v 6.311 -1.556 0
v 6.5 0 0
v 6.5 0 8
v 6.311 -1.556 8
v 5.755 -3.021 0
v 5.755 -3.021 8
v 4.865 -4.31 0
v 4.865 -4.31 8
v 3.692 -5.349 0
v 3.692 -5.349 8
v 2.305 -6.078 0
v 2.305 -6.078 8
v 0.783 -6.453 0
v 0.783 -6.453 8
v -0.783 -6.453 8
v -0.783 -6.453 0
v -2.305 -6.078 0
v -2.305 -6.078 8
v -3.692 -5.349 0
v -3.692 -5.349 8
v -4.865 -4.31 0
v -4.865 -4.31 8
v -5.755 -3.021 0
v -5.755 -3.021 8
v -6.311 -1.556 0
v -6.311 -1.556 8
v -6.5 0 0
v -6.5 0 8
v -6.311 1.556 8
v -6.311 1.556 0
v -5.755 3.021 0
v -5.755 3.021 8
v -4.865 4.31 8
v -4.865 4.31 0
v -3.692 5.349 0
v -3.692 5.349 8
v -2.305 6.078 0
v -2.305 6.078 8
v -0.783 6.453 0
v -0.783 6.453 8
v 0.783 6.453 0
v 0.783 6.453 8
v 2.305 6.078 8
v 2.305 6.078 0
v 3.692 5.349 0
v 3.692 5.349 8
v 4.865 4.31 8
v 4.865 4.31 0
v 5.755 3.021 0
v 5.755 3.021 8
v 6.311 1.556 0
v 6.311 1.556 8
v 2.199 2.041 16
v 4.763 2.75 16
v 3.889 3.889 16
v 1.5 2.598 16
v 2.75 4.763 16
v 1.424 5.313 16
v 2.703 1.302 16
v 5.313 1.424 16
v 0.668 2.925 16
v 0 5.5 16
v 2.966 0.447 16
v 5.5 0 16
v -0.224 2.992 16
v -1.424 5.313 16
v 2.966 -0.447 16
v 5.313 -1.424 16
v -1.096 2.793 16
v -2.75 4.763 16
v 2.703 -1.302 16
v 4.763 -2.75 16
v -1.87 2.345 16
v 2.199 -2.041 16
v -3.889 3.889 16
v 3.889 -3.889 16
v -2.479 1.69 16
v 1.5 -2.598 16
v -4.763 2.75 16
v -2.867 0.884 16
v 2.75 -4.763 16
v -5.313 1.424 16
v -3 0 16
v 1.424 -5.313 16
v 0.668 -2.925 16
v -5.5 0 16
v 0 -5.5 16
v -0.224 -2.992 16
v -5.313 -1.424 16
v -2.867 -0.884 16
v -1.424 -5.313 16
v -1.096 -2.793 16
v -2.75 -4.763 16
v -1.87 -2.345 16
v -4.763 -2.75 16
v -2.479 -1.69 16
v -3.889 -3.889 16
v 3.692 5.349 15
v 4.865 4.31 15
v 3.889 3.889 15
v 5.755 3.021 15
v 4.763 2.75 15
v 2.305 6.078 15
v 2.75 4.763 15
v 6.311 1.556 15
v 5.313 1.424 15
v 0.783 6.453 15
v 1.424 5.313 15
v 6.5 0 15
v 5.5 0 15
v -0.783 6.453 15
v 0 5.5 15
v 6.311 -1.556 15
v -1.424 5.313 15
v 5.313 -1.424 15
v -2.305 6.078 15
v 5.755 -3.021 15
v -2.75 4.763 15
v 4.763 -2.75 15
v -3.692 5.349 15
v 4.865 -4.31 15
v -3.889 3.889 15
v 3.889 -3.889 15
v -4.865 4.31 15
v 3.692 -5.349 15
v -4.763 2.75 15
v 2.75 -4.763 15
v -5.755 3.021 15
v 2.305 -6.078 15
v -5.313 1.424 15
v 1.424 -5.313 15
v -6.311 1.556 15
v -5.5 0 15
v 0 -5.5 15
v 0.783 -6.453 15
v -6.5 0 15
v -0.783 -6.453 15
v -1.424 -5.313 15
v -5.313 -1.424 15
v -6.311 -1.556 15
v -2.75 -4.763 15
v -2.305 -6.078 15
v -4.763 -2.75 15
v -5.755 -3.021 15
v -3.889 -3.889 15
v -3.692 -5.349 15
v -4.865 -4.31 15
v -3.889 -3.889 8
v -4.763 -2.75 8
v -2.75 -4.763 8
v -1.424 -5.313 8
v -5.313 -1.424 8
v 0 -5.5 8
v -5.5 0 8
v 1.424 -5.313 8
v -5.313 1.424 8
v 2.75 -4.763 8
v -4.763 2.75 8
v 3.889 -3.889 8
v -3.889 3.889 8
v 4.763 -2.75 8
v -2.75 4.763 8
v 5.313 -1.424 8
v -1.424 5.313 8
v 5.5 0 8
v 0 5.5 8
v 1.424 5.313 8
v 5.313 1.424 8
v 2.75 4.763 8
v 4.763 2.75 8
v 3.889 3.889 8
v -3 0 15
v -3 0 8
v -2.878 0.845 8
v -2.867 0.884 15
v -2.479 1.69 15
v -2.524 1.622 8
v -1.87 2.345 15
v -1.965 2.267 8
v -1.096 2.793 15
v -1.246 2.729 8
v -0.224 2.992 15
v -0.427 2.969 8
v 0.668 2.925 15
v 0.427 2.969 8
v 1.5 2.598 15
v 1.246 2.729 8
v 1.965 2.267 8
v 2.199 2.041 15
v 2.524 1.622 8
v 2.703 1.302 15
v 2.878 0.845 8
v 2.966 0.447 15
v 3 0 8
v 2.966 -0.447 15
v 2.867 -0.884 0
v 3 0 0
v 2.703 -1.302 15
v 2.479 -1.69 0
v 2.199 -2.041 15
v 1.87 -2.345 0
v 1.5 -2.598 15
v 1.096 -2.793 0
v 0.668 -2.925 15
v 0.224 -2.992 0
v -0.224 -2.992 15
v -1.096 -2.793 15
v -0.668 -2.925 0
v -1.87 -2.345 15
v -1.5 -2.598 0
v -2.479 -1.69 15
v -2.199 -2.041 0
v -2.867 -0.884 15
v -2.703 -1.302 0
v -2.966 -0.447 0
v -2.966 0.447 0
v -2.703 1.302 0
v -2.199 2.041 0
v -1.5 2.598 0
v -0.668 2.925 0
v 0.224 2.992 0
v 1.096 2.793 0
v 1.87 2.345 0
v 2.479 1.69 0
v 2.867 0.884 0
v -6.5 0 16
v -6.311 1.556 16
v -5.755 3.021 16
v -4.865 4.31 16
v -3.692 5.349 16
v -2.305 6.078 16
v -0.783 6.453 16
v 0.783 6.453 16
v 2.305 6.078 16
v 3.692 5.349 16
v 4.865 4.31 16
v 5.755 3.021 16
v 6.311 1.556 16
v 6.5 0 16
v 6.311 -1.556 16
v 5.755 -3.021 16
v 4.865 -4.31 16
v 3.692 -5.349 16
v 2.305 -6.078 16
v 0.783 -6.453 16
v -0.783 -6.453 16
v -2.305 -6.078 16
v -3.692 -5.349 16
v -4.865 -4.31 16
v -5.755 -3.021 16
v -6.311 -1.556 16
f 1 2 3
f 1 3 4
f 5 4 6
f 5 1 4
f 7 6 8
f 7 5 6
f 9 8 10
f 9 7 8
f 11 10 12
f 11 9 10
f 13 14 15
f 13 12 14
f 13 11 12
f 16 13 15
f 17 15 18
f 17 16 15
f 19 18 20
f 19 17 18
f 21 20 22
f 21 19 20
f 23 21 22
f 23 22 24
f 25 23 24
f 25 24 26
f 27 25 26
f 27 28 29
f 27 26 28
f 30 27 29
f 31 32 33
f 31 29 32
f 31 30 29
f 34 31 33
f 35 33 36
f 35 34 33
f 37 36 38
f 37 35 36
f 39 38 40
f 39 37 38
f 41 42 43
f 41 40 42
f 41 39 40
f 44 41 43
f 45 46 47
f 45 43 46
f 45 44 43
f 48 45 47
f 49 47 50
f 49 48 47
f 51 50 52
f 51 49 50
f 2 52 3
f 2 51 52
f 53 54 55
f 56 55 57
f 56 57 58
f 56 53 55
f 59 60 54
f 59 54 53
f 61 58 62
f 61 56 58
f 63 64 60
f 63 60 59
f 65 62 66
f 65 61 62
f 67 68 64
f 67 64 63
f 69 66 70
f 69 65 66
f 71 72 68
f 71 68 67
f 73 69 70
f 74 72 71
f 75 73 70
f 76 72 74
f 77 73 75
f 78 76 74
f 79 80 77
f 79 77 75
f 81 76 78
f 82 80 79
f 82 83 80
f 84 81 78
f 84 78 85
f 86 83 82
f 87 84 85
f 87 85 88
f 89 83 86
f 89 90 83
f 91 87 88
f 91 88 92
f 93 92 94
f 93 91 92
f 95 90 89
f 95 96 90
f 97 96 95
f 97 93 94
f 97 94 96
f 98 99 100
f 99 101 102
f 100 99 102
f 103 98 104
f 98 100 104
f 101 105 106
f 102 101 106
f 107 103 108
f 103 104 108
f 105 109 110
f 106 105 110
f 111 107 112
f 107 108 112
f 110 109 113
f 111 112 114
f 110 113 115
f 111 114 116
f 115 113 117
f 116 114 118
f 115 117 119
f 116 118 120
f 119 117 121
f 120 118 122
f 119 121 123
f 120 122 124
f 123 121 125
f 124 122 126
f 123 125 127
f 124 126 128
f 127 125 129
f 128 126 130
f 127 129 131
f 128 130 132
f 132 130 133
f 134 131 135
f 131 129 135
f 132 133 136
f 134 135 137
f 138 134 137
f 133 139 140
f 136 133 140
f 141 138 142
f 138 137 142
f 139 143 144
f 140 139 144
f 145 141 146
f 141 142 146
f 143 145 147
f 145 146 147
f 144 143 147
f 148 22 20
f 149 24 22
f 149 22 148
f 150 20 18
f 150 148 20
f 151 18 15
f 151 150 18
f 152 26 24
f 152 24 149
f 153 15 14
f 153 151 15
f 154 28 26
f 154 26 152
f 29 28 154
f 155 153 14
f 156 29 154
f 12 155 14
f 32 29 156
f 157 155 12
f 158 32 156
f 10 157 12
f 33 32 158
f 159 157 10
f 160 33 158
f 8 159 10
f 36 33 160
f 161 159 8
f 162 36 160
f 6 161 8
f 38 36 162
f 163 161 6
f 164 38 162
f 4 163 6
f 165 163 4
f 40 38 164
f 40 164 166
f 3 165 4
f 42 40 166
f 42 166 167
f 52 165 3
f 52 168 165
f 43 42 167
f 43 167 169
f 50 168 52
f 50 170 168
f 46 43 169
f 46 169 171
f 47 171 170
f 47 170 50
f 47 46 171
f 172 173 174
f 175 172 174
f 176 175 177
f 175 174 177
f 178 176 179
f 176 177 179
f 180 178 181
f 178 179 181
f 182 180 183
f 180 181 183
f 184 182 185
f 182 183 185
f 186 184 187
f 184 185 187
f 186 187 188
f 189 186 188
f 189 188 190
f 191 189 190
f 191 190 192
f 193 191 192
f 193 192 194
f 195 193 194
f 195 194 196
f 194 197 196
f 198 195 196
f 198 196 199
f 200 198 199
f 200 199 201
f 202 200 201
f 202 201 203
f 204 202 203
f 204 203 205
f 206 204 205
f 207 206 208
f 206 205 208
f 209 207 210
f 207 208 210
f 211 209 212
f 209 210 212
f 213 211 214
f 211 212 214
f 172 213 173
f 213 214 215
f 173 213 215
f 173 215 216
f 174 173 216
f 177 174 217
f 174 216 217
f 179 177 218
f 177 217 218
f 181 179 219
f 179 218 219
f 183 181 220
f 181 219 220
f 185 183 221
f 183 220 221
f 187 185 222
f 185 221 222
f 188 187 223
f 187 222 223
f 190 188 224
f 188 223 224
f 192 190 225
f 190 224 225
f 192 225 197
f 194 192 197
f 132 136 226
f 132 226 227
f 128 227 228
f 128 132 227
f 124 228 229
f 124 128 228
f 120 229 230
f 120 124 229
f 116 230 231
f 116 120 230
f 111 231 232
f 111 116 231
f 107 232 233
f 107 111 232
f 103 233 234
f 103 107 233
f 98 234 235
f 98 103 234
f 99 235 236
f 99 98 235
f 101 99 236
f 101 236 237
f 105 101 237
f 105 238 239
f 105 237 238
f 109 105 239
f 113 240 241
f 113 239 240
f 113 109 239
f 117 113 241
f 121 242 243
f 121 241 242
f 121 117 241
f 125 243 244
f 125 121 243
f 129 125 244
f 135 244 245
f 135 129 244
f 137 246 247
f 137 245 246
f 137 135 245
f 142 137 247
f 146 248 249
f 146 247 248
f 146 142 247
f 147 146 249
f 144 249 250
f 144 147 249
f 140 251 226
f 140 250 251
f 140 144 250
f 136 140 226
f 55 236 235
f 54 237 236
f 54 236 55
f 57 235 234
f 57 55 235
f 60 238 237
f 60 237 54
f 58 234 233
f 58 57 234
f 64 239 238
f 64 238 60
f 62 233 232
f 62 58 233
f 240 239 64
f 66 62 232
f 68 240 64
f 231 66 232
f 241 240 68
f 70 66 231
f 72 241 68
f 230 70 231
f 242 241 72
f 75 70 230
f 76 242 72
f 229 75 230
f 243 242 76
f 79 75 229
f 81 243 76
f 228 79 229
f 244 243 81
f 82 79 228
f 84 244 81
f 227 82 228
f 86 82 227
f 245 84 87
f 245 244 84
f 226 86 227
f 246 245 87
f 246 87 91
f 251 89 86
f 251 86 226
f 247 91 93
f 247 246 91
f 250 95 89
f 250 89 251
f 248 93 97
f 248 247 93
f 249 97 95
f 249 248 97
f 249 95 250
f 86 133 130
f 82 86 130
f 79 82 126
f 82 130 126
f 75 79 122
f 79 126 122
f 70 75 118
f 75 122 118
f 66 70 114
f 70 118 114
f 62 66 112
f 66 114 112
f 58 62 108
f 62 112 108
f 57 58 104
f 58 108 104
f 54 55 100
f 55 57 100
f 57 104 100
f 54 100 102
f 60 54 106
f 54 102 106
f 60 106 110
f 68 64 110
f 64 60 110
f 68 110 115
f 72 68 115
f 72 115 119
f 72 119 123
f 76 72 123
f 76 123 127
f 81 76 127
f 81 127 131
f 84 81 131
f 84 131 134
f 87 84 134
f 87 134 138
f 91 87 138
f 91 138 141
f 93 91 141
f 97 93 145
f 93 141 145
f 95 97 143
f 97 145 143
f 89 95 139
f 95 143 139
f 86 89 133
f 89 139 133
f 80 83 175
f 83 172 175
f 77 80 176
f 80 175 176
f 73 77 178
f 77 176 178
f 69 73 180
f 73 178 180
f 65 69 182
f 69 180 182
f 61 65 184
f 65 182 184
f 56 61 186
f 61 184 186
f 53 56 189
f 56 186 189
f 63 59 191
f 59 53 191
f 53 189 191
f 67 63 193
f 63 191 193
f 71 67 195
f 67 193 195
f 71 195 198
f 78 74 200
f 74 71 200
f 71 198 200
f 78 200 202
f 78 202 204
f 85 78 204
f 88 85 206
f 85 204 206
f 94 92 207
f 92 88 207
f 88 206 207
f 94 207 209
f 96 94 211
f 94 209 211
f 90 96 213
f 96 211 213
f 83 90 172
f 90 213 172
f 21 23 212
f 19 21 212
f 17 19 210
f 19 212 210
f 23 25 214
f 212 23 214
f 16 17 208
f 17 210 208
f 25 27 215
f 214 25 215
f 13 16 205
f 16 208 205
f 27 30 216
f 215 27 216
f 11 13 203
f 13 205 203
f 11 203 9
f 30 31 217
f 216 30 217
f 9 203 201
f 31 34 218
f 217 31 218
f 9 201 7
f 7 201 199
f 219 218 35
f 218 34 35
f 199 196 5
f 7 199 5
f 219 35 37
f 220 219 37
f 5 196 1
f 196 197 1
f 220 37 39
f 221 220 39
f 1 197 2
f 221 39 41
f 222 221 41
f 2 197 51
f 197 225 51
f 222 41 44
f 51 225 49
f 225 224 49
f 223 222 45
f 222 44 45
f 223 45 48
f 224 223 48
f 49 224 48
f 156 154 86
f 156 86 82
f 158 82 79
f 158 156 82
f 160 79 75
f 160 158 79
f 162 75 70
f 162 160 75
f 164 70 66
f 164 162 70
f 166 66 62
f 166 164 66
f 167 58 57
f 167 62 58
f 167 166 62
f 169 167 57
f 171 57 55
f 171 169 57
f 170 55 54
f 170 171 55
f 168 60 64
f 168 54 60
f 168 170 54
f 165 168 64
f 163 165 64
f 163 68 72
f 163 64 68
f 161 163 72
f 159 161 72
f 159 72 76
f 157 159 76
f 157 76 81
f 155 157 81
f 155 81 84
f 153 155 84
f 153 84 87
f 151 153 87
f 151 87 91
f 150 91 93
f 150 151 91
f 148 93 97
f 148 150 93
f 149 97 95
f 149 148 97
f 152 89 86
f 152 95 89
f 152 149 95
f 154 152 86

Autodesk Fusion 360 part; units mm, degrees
sketch "Skizze1" plane through (0, 0, 0) normal (0, 0, 1) x (1, 0, 0)
  circle A0 centre (0, 0) radius 6.5
  circle A1 centre (0, 0) radius 3
  dimension "d1" = 13
  dimension "d2" = 6
extrude "Extrusion1" add sketch "Skizze1" along normal blind 8 makes body 1
sketch "Skizze2" plane through (0, 0, 8) normal (0, 0, 1) x (-1, 0, 0)
  circle A0 centre (0, 0) radius 3
  circle A1 centre (0, 0) radius 6.5
  circle A2 centre (0, 0) radius 5.5
  dimension "d5" = 11
extrude "Extrusion2" add sketch "Skizze2" along normal blind 7 contours A2 bodies 1
sketch "Skizze3" plane through (0, 0, 15) normal (0, 0, 1) x (-1, 0, 0)
  circle A0 centre (0, 0) radius 3
  circle A1 centre (0, 0) radius 5.5
  circle A2 centre (0, 0) radius 6.5
  dimension "d8" = 13
extrude "Extrusion4" add sketch "Skizze3" along normal blind 1 separate body contours A2 makes body 2
extrude "Extrusion3" add sketch "Skizze3" along normal blind 1 contours A1 bodies 1
